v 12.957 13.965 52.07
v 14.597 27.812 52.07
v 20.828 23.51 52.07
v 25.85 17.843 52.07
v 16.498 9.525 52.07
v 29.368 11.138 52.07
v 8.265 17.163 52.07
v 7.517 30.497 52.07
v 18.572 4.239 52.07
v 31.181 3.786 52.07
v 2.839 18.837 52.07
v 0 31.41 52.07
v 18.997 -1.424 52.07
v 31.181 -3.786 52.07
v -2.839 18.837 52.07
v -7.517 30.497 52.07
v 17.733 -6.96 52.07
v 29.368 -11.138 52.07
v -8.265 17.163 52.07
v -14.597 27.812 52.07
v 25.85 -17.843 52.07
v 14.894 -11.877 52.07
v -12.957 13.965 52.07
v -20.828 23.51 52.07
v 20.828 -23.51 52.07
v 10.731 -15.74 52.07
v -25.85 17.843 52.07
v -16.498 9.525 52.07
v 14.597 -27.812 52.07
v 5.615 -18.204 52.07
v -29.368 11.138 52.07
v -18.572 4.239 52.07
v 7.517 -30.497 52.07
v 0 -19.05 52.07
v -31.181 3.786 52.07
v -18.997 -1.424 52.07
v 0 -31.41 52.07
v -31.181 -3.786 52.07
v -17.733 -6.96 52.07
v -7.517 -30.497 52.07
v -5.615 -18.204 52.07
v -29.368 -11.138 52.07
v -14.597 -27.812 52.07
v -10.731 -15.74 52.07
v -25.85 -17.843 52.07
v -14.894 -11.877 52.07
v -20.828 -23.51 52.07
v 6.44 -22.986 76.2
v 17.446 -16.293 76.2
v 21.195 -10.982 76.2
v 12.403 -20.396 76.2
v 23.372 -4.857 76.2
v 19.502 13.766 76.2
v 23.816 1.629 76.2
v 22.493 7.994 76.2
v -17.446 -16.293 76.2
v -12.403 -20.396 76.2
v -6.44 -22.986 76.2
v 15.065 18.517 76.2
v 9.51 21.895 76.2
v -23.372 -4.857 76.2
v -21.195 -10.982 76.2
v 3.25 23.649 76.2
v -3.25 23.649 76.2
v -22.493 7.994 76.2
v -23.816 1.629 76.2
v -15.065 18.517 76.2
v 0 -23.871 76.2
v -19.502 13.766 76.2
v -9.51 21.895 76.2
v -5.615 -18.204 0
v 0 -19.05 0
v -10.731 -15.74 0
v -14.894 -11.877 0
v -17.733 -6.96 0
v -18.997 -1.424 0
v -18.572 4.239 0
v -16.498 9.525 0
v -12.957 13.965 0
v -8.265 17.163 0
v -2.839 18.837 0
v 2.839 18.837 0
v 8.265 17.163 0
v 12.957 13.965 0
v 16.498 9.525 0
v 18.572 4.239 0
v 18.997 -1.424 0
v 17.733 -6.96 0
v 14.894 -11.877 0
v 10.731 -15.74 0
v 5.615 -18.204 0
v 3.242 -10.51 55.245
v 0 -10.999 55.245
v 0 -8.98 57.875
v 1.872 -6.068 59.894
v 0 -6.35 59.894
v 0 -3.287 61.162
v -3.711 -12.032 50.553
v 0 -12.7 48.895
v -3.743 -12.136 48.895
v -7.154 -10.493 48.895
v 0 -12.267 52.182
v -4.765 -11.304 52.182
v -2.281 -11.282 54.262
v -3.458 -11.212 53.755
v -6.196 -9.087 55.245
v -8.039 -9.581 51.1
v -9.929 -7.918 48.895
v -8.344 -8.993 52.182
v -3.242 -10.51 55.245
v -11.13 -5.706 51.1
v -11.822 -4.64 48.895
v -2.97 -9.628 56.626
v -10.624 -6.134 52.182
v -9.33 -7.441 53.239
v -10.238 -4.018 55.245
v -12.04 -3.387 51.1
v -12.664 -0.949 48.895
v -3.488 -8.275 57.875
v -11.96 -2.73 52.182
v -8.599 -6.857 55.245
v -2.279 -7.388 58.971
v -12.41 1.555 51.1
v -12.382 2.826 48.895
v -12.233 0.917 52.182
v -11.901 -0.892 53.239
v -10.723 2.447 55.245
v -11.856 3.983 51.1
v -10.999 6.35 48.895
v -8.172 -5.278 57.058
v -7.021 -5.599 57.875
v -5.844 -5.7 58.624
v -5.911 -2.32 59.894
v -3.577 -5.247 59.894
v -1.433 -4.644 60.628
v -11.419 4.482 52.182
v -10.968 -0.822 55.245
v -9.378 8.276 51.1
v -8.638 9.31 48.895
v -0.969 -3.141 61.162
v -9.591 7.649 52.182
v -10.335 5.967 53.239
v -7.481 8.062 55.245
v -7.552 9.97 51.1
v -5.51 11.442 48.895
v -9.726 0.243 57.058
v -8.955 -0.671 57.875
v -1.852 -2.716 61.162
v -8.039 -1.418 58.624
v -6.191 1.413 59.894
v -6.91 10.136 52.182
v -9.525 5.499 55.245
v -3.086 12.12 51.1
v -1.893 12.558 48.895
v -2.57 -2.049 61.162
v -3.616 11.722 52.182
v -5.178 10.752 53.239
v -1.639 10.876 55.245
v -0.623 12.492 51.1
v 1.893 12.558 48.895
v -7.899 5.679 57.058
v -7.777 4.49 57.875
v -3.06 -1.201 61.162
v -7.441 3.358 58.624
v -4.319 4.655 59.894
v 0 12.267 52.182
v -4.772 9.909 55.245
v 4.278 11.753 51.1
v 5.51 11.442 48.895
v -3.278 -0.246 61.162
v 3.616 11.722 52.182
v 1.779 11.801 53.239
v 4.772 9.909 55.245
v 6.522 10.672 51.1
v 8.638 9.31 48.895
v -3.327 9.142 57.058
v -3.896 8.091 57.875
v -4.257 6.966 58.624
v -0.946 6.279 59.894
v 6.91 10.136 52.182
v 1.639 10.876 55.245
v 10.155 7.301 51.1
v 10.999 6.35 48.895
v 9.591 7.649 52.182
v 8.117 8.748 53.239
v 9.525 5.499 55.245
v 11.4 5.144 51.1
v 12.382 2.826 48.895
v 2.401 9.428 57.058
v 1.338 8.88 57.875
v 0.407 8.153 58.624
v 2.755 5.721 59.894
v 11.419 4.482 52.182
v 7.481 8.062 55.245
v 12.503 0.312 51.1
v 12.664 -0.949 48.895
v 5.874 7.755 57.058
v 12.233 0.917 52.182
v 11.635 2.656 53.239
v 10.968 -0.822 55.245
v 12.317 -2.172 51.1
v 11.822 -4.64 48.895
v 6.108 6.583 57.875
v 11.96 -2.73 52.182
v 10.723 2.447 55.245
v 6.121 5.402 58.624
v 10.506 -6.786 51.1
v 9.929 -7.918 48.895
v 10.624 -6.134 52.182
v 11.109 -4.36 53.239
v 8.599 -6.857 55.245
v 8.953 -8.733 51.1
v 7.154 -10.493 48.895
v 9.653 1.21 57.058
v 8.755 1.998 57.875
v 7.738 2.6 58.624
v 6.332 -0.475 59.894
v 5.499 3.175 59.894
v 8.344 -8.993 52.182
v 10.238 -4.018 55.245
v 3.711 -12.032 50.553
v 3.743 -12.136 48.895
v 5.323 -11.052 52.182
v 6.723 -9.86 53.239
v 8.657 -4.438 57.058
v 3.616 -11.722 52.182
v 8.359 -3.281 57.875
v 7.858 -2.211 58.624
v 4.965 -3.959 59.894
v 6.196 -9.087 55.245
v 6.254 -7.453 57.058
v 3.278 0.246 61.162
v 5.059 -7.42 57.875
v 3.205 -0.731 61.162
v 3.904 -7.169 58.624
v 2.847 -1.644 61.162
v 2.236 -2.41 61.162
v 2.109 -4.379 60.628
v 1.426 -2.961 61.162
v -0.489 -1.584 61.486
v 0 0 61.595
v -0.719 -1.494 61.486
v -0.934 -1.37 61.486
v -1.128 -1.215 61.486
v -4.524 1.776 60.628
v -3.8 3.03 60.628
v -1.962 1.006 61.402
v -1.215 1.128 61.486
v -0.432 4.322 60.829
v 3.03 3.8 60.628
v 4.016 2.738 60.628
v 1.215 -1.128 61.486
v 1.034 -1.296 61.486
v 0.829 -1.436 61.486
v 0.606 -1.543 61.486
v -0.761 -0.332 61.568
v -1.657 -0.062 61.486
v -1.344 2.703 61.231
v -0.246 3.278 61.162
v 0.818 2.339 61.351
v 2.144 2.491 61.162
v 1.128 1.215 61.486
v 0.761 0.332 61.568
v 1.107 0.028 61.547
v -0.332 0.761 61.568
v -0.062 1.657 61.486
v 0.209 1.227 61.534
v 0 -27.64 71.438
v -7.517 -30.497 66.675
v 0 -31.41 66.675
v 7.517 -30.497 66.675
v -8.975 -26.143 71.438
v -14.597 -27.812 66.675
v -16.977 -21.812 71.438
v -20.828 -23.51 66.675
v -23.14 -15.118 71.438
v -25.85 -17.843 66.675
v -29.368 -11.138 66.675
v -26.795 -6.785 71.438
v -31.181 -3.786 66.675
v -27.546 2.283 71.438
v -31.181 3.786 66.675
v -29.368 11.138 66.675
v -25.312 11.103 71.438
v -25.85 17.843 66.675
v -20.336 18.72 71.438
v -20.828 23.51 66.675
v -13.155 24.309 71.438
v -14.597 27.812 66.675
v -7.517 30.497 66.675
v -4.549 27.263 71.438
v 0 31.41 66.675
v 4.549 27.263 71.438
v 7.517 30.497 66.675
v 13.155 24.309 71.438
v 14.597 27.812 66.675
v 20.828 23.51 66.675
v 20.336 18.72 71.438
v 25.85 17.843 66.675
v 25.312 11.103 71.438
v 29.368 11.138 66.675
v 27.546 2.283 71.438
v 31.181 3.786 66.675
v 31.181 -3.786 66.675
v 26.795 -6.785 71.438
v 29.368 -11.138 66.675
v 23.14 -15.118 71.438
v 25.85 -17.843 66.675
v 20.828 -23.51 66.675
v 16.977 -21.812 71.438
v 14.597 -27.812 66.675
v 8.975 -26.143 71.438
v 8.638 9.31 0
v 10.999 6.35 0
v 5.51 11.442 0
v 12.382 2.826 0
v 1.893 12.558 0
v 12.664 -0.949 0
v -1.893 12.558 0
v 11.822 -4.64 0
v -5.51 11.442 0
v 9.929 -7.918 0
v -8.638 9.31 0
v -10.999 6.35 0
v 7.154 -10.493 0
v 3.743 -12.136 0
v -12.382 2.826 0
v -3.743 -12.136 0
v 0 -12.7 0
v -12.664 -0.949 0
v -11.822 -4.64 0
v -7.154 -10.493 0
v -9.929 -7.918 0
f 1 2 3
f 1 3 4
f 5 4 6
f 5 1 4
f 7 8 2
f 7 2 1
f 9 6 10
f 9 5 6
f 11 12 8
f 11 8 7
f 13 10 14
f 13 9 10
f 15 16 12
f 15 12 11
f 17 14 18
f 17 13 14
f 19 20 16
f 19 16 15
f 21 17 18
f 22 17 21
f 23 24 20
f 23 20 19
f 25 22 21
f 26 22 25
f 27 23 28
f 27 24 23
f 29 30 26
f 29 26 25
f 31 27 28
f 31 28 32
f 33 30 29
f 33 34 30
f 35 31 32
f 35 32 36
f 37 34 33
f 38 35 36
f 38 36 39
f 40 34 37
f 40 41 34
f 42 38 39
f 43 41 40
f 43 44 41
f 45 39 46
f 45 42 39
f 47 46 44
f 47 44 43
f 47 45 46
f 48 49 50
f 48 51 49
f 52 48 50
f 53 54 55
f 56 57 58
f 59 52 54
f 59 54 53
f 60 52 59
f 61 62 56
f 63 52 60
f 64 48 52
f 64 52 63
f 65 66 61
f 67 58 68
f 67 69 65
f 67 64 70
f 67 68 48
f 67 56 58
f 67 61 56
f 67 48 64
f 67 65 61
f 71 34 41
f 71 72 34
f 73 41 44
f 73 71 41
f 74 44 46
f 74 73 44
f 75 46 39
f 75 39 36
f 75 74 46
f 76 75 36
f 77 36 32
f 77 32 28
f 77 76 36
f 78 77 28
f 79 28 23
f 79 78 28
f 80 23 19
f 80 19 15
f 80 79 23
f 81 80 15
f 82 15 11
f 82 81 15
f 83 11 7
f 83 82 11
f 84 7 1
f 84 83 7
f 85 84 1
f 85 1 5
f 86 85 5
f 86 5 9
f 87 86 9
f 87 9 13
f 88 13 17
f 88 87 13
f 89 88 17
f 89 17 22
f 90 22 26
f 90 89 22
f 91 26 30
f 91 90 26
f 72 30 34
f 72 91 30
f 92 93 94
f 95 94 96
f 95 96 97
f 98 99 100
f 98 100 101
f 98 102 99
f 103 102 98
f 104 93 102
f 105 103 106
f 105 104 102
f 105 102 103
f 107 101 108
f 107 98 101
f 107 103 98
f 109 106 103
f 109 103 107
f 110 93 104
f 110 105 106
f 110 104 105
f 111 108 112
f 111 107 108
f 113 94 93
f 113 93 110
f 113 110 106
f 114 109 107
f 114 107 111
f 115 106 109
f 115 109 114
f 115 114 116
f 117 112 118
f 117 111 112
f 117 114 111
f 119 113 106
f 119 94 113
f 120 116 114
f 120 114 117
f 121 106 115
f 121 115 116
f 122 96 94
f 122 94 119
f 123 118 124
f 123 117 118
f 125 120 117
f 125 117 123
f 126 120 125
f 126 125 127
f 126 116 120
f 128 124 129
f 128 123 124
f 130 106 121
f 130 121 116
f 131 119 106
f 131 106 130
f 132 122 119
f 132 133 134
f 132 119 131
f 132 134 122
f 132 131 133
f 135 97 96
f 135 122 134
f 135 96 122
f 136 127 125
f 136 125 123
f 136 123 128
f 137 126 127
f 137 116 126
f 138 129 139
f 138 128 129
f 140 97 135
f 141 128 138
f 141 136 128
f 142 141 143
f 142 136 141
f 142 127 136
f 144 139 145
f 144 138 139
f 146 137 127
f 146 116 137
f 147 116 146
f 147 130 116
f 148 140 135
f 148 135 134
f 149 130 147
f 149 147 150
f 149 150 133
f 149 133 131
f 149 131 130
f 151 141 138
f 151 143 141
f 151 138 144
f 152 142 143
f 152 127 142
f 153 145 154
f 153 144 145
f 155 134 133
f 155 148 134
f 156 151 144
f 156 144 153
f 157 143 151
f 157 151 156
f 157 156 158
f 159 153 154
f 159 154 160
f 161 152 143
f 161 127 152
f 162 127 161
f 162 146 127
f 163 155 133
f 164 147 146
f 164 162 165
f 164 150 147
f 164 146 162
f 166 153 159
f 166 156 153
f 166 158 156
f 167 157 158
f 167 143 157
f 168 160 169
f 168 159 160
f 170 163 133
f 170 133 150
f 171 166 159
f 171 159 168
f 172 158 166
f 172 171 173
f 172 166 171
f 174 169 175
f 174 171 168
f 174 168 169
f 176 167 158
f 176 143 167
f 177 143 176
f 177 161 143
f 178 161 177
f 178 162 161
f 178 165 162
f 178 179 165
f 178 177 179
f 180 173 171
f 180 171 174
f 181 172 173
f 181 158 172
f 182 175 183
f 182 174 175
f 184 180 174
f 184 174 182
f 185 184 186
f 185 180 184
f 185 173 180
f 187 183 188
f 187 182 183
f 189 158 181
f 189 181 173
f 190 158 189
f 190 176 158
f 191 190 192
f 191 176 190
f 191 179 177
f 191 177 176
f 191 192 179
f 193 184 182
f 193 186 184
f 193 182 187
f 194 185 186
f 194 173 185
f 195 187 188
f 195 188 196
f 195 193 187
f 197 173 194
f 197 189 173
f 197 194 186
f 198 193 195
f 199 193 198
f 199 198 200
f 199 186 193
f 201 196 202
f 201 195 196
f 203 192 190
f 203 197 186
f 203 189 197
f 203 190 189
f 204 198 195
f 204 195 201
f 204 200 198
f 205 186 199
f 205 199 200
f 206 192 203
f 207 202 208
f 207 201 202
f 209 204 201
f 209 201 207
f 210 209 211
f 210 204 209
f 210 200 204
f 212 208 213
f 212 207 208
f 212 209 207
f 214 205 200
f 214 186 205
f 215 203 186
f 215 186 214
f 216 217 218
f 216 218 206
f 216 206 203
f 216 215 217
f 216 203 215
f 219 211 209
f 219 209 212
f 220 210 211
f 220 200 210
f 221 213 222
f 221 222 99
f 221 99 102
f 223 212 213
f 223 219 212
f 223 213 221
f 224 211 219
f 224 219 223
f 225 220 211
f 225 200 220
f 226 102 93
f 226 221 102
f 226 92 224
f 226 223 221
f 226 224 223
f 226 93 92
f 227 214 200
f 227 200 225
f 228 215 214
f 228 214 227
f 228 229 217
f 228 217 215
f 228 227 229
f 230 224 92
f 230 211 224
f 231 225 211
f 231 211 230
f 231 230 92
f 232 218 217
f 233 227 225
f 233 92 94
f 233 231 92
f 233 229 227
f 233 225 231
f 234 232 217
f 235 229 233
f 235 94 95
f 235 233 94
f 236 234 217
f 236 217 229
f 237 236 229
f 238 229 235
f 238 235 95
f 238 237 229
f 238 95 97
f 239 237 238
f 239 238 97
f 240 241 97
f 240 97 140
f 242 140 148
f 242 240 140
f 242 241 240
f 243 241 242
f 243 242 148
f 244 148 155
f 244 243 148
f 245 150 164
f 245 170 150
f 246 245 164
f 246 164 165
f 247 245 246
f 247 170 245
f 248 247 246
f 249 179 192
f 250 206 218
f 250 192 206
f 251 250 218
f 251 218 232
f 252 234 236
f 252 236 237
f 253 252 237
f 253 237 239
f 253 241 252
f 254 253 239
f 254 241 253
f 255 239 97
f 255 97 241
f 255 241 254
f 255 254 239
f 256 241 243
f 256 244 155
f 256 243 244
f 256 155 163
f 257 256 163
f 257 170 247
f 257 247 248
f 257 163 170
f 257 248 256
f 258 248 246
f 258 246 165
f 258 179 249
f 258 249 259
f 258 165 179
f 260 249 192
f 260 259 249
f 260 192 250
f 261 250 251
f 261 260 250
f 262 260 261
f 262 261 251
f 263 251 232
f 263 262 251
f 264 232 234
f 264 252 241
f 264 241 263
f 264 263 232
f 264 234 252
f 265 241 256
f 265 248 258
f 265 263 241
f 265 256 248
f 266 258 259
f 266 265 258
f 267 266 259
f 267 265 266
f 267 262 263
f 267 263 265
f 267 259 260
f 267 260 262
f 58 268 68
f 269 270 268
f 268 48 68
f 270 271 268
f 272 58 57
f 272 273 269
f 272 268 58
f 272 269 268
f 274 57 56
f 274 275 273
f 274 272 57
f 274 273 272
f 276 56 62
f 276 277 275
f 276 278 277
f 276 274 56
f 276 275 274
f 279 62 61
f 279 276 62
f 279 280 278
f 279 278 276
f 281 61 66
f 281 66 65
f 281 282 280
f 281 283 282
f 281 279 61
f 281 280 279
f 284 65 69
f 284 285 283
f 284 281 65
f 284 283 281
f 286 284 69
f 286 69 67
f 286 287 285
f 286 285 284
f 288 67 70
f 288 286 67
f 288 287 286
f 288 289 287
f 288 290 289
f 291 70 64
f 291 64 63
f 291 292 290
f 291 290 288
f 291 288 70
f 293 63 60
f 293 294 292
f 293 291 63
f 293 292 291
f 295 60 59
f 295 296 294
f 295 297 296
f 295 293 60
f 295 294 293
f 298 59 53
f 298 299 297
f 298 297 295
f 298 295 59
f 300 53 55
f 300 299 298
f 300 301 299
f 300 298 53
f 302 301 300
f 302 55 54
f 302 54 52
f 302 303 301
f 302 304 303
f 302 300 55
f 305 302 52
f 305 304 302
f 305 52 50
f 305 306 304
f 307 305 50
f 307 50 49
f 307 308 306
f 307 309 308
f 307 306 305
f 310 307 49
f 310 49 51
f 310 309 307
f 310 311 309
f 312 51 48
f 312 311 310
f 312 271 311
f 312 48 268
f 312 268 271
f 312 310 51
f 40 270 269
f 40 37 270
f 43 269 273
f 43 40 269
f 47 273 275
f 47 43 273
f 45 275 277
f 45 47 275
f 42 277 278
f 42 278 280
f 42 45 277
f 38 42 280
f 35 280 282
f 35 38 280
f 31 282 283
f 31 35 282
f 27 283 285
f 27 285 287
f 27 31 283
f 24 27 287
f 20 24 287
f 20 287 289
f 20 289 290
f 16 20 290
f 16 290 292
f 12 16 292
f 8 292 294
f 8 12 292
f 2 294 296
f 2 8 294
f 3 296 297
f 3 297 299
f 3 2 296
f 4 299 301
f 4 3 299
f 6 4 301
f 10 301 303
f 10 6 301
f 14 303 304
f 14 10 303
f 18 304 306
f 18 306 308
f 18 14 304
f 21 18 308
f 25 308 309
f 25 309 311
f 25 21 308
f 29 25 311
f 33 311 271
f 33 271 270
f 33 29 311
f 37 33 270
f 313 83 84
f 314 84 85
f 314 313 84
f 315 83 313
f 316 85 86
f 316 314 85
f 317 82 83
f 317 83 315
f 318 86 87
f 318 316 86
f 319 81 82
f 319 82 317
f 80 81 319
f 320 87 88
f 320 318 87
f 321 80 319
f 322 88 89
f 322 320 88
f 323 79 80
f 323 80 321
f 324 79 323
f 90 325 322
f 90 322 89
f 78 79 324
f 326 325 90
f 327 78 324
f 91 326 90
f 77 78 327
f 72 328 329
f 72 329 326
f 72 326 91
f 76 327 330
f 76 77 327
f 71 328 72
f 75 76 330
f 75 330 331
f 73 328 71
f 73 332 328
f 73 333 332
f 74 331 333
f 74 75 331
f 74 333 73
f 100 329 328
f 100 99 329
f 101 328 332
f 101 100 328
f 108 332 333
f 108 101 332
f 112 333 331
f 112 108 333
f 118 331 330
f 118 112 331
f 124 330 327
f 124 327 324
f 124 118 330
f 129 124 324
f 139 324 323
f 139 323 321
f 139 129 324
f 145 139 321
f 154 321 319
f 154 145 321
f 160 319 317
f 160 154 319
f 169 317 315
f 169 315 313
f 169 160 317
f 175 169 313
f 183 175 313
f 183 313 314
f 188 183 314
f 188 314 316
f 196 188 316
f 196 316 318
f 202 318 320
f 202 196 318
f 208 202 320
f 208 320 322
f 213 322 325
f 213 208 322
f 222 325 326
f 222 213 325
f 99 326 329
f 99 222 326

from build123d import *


with BuildPart() as f1:
    # F0 (on Right) → F1 (revolve)
    with BuildSketch(Plane.YZ):
        with BuildLine():
            Line((-19.05, 0), (-12.7, 0))
            Line((-12.7, 0), (-12.7, 48.895))
            ThreePointArc((-12.7, 48.895), (-8.980256, 57.875256), (0, 61.595))
            Line((0, 61.595), (0, 76.2))
            Line((0, 76.2), (-23.871235, 76.2))
            Line((-23.871235, 76.2), (-31.409519, 66.675))
            Line((-31.409519, 66.675), (-31.409519, 52.07))
            Line((-31.409519, 52.07), (-19.05, 52.07))
            Line((-19.05, 52.07), (-19.05, 0))
        make_face()
    revolve(axis=Axis((0, 0, 68.8975), (0, 0, -1)))


solid = f1.part
